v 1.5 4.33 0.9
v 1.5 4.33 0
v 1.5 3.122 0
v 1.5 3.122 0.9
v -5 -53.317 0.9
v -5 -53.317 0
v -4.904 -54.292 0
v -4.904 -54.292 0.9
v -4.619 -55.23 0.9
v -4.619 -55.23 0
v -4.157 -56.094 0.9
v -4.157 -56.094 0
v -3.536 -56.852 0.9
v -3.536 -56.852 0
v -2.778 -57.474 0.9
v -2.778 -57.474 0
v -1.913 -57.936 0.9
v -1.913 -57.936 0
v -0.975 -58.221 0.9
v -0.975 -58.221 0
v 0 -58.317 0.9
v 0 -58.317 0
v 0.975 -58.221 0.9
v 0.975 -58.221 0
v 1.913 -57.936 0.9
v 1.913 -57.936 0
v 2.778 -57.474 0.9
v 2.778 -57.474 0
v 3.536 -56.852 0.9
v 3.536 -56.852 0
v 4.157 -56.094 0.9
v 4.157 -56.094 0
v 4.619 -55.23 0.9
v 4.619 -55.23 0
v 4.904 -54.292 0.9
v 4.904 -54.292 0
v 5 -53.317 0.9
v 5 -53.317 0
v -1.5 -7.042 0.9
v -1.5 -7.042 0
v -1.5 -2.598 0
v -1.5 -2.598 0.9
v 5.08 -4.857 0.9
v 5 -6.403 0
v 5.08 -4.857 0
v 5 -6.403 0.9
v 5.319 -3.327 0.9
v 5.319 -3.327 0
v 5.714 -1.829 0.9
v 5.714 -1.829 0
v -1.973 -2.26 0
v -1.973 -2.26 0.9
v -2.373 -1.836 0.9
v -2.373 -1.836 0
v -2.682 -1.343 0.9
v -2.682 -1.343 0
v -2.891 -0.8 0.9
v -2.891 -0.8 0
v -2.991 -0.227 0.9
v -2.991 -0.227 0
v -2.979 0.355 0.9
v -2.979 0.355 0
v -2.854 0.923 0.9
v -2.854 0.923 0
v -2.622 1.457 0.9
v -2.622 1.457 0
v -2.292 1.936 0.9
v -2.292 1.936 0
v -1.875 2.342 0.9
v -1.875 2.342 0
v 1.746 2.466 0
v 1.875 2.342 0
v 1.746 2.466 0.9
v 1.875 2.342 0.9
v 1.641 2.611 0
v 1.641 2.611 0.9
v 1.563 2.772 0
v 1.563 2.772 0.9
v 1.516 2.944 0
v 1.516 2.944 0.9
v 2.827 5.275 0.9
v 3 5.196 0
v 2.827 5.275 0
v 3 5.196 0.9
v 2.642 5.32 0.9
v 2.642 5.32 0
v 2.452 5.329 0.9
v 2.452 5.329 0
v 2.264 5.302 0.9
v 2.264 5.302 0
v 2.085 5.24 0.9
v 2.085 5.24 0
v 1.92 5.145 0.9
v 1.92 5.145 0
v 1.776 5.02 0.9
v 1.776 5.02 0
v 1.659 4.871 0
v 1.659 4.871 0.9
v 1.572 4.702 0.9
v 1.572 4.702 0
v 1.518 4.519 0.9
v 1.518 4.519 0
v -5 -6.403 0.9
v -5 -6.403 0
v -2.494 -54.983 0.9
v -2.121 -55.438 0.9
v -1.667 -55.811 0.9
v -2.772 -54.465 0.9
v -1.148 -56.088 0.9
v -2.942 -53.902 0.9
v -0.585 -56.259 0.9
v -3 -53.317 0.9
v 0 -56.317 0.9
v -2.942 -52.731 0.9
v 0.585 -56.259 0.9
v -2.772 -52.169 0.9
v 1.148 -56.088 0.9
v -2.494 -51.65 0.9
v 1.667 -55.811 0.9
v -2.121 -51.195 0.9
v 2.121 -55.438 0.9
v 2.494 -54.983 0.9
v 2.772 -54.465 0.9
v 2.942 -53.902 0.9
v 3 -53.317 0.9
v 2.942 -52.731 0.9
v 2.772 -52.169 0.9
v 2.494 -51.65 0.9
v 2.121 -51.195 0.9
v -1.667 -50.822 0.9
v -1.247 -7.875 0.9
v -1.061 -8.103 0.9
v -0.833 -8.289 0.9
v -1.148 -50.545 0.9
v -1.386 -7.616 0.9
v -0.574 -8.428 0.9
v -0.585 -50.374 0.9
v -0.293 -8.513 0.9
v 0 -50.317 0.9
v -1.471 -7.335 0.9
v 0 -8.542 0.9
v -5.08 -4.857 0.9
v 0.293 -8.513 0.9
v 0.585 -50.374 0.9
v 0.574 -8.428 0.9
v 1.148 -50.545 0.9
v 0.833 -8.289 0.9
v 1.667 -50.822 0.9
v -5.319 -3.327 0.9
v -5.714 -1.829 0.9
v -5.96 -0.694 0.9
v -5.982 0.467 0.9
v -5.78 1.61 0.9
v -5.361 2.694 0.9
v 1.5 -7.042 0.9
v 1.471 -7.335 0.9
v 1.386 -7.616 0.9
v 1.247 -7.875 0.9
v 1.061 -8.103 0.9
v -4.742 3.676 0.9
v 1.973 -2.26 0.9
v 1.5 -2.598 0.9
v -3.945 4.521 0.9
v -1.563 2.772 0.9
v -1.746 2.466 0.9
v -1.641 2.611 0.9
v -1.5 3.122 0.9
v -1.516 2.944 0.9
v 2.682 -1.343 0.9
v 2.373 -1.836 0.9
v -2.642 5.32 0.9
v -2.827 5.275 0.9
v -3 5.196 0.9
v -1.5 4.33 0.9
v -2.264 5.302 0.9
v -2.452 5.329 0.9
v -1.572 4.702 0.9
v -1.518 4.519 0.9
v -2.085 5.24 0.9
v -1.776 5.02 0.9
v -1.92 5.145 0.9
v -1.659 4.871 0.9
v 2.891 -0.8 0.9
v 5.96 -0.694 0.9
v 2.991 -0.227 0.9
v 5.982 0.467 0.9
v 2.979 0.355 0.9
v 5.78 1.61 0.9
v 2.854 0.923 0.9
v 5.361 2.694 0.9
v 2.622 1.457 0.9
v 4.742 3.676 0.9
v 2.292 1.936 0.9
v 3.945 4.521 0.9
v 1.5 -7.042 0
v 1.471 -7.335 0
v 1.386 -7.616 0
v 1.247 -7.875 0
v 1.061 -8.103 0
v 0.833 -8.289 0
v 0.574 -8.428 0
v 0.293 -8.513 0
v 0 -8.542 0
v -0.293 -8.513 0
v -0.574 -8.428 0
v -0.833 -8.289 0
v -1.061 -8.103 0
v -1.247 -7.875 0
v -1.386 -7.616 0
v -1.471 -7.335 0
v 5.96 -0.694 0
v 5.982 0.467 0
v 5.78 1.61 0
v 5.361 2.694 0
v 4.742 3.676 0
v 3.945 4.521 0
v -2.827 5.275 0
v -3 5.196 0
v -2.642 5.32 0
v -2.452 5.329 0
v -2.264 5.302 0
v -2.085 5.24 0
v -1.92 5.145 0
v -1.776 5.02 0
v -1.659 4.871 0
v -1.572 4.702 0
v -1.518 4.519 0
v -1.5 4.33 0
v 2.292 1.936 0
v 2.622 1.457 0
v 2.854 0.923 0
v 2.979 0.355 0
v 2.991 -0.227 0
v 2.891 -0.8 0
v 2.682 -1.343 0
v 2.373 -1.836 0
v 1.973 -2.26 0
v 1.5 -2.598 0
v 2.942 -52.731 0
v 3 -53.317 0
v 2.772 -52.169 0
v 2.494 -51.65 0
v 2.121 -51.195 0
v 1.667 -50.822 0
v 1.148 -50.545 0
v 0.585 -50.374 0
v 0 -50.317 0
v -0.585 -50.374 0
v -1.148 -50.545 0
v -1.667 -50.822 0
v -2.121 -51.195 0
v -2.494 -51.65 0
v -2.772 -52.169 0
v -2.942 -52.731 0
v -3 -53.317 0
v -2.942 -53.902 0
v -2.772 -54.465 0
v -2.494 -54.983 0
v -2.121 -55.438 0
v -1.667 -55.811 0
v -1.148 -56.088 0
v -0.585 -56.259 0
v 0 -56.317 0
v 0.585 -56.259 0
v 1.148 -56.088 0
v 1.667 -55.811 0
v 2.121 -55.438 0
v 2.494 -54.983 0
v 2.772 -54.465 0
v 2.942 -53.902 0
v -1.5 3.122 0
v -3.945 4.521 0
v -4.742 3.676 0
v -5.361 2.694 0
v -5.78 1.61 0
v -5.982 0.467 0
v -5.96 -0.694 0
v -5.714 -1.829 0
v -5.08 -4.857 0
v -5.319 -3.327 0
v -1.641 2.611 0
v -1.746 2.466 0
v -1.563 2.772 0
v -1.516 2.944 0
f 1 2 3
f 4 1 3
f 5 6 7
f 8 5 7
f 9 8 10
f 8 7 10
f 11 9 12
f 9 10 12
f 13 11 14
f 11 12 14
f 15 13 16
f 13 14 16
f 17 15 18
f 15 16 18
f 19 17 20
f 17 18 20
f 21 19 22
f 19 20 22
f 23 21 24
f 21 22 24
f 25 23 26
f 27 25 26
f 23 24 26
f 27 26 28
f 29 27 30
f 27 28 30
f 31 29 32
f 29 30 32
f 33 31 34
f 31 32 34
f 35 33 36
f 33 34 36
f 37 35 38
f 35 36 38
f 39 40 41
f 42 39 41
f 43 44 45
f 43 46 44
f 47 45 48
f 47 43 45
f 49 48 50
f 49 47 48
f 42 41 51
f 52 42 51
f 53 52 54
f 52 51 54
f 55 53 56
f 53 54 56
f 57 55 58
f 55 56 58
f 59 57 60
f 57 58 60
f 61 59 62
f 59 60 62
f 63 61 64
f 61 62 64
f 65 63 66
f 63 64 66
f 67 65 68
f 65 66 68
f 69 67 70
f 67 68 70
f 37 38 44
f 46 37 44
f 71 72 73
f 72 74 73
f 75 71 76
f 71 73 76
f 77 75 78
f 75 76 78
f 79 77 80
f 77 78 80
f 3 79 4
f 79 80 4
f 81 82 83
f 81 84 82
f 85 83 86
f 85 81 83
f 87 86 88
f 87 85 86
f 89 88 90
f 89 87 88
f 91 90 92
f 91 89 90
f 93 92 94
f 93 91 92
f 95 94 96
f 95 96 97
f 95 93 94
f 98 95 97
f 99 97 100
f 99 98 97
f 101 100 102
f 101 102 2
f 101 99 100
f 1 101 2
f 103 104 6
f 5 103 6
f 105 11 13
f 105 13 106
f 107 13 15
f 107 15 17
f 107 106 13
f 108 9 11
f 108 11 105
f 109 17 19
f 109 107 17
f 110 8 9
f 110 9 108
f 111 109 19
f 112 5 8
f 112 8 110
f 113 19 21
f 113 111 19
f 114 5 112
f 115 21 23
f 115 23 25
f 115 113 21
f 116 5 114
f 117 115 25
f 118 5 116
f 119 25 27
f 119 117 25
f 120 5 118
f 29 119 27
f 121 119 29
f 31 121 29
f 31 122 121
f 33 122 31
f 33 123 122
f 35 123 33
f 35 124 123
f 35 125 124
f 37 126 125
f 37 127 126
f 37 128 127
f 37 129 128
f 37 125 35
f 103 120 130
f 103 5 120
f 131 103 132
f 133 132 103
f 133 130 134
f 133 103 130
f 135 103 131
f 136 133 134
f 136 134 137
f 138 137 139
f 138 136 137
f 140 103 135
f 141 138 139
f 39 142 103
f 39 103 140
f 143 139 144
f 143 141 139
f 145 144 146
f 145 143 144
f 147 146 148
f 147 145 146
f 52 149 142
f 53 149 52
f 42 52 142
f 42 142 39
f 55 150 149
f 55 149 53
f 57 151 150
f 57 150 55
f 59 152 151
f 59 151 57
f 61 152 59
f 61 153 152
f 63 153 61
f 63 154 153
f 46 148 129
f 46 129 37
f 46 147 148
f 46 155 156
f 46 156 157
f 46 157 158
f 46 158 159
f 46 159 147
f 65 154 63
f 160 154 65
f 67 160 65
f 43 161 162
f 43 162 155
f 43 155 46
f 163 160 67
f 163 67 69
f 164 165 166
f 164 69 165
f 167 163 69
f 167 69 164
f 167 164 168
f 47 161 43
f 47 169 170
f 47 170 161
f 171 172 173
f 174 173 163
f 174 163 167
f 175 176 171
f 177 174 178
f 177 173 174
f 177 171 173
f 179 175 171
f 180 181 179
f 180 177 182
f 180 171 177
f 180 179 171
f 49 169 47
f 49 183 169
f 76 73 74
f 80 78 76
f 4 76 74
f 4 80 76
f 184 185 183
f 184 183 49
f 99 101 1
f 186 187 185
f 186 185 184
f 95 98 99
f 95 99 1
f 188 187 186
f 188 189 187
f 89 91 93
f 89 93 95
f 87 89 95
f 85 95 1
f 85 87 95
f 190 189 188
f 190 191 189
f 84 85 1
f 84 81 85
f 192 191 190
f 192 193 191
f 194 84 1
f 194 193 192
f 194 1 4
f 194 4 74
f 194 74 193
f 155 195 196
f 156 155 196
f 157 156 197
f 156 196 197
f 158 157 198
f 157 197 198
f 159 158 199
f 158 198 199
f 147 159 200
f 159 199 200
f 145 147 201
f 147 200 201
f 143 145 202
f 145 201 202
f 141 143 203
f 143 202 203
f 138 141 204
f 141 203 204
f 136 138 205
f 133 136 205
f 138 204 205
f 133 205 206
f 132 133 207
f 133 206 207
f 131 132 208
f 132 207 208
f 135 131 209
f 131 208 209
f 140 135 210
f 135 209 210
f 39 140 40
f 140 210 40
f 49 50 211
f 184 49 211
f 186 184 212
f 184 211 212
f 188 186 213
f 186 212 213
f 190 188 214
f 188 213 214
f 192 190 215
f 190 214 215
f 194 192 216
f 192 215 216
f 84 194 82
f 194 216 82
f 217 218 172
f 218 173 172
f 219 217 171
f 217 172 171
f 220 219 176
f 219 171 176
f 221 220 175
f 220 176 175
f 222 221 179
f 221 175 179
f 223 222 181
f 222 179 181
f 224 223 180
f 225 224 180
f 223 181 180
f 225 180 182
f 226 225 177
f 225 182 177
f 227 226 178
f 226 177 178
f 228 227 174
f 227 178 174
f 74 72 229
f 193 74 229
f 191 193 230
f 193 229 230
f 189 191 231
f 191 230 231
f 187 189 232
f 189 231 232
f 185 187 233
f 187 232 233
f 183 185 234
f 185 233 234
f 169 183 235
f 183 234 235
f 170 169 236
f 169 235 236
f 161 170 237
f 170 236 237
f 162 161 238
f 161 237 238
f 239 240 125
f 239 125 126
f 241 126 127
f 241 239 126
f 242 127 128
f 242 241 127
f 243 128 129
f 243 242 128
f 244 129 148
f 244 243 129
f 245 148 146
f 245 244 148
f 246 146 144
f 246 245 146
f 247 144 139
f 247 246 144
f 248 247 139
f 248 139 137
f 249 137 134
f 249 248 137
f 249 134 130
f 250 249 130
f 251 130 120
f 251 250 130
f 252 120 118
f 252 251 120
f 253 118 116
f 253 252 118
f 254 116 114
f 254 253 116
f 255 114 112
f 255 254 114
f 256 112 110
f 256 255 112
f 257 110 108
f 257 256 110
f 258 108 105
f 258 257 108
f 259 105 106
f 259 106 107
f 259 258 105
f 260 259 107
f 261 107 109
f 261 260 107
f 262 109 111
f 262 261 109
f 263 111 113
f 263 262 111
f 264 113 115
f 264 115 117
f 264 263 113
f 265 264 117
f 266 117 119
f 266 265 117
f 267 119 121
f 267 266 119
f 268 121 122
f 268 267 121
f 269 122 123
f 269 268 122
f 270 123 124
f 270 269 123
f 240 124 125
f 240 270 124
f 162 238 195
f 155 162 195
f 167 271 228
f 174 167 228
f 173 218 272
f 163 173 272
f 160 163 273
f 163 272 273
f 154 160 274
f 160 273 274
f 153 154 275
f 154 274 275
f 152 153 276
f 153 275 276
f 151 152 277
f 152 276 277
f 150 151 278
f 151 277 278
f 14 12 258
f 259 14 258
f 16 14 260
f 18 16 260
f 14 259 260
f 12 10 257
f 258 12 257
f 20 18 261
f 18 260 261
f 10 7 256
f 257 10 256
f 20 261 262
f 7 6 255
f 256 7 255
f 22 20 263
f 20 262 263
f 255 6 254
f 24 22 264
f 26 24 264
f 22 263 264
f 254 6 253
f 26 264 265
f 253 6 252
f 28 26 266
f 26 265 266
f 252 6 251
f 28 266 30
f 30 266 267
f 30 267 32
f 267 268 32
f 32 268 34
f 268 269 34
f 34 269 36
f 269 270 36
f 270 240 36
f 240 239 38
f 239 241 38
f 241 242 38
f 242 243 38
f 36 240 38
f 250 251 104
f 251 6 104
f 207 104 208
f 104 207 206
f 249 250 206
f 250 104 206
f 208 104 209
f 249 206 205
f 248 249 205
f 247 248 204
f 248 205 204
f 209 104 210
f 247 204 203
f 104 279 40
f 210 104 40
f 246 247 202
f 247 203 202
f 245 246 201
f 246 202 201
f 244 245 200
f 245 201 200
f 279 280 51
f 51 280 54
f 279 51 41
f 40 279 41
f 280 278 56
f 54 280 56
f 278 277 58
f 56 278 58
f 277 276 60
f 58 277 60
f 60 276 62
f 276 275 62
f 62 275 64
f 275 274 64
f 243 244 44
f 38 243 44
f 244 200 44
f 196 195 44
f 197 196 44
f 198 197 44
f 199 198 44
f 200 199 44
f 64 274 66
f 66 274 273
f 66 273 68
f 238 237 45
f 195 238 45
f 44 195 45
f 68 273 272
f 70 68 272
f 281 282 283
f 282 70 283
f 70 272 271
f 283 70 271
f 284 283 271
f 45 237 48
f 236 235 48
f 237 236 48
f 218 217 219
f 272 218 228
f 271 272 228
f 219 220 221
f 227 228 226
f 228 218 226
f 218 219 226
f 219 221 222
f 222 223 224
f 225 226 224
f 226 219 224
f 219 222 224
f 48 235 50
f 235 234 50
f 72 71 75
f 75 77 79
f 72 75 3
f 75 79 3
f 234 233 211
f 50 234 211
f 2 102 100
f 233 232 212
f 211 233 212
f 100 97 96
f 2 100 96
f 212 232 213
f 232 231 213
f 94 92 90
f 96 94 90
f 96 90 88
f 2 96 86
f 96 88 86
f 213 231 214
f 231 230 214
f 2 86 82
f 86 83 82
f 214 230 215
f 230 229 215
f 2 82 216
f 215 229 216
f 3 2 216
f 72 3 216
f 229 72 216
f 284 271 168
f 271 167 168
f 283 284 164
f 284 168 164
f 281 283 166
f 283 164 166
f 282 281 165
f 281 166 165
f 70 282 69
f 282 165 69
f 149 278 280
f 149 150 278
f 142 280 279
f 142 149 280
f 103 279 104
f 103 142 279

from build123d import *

# Parameters (mm, degrees)
ESQUISSE1_R        = 3
BOSS_EXTRU_1_DEPTH = 0.9
CONG_1_R           = 15
CONG_2_R           = 1


with BuildPart() as part:
    # Esquisse1 → Boss.-Extru.1 (new body)
    with BuildSketch(Plane.XY):
        with BuildLine():
            Line((-1.5, 2.598076211), (-1.5, 5.809475019))
            ThreePointArc((-1.5, 5.809475019), (-5.602135703, 2.148505426), (-5, -3.31662479))
            Line((-5, -3.31662479), (-5, -53.31662479))
            ThreePointArc((-5, -53.31662479), (0, -58.31662479), (5, -53.31662479))
            Line((5, -53.31662479), (5, -3.31662479))
            ThreePointArc((5, -3.31662479), (5.602135703, 2.148505426), (1.5, 5.809475019))
            Line((1.5, 5.809475019), (1.5, 2.598076211))
            ThreePointArc((1.5, 2.598076211), (3, 0), (1.5, -2.598076211))
            Line((1.5, -2.598076211), (1.5, -7.04210447))
            ThreePointArc((1.5, -7.04210447), (0, -8.54210447), (-1.5, -7.04210447))
            Line((-1.5, -7.04210447), (-1.5, -2.598076211))
            ThreePointArc((-1.5, -2.598076211), (-3, 0), (-1.5, 2.598076211))
        make_face()
        with Locations((0, -53.31662479)):
            Circle(ESQUISSE1_R, mode=Mode.SUBTRACT)
    extrude(amount=BOSS_EXTRU_1_DEPTH)

    # Congé1
    cong_1_edges = [part.edges().sort_by_distance(p)[0] for p in [
        (5, -3.31662479, 0.45),
        (-5, -3.31662479, 0.45),
    ]]
    fillet(cong_1_edges, radius=CONG_1_R)

    # Congé2
    cong_2_edges = [part.edges().sort_by_distance(p)[0] for p in [
        (1.5, 2.598076211, 0.45),
        (1.5, 5.809475019, 0.45),
        (-1.5, 5.809475019, 0.45),
        (-1.5, 2.598076211, 0.45),
    ]]
    fillet(cong_2_edges, radius=CONG_2_R)


solid = part.part
